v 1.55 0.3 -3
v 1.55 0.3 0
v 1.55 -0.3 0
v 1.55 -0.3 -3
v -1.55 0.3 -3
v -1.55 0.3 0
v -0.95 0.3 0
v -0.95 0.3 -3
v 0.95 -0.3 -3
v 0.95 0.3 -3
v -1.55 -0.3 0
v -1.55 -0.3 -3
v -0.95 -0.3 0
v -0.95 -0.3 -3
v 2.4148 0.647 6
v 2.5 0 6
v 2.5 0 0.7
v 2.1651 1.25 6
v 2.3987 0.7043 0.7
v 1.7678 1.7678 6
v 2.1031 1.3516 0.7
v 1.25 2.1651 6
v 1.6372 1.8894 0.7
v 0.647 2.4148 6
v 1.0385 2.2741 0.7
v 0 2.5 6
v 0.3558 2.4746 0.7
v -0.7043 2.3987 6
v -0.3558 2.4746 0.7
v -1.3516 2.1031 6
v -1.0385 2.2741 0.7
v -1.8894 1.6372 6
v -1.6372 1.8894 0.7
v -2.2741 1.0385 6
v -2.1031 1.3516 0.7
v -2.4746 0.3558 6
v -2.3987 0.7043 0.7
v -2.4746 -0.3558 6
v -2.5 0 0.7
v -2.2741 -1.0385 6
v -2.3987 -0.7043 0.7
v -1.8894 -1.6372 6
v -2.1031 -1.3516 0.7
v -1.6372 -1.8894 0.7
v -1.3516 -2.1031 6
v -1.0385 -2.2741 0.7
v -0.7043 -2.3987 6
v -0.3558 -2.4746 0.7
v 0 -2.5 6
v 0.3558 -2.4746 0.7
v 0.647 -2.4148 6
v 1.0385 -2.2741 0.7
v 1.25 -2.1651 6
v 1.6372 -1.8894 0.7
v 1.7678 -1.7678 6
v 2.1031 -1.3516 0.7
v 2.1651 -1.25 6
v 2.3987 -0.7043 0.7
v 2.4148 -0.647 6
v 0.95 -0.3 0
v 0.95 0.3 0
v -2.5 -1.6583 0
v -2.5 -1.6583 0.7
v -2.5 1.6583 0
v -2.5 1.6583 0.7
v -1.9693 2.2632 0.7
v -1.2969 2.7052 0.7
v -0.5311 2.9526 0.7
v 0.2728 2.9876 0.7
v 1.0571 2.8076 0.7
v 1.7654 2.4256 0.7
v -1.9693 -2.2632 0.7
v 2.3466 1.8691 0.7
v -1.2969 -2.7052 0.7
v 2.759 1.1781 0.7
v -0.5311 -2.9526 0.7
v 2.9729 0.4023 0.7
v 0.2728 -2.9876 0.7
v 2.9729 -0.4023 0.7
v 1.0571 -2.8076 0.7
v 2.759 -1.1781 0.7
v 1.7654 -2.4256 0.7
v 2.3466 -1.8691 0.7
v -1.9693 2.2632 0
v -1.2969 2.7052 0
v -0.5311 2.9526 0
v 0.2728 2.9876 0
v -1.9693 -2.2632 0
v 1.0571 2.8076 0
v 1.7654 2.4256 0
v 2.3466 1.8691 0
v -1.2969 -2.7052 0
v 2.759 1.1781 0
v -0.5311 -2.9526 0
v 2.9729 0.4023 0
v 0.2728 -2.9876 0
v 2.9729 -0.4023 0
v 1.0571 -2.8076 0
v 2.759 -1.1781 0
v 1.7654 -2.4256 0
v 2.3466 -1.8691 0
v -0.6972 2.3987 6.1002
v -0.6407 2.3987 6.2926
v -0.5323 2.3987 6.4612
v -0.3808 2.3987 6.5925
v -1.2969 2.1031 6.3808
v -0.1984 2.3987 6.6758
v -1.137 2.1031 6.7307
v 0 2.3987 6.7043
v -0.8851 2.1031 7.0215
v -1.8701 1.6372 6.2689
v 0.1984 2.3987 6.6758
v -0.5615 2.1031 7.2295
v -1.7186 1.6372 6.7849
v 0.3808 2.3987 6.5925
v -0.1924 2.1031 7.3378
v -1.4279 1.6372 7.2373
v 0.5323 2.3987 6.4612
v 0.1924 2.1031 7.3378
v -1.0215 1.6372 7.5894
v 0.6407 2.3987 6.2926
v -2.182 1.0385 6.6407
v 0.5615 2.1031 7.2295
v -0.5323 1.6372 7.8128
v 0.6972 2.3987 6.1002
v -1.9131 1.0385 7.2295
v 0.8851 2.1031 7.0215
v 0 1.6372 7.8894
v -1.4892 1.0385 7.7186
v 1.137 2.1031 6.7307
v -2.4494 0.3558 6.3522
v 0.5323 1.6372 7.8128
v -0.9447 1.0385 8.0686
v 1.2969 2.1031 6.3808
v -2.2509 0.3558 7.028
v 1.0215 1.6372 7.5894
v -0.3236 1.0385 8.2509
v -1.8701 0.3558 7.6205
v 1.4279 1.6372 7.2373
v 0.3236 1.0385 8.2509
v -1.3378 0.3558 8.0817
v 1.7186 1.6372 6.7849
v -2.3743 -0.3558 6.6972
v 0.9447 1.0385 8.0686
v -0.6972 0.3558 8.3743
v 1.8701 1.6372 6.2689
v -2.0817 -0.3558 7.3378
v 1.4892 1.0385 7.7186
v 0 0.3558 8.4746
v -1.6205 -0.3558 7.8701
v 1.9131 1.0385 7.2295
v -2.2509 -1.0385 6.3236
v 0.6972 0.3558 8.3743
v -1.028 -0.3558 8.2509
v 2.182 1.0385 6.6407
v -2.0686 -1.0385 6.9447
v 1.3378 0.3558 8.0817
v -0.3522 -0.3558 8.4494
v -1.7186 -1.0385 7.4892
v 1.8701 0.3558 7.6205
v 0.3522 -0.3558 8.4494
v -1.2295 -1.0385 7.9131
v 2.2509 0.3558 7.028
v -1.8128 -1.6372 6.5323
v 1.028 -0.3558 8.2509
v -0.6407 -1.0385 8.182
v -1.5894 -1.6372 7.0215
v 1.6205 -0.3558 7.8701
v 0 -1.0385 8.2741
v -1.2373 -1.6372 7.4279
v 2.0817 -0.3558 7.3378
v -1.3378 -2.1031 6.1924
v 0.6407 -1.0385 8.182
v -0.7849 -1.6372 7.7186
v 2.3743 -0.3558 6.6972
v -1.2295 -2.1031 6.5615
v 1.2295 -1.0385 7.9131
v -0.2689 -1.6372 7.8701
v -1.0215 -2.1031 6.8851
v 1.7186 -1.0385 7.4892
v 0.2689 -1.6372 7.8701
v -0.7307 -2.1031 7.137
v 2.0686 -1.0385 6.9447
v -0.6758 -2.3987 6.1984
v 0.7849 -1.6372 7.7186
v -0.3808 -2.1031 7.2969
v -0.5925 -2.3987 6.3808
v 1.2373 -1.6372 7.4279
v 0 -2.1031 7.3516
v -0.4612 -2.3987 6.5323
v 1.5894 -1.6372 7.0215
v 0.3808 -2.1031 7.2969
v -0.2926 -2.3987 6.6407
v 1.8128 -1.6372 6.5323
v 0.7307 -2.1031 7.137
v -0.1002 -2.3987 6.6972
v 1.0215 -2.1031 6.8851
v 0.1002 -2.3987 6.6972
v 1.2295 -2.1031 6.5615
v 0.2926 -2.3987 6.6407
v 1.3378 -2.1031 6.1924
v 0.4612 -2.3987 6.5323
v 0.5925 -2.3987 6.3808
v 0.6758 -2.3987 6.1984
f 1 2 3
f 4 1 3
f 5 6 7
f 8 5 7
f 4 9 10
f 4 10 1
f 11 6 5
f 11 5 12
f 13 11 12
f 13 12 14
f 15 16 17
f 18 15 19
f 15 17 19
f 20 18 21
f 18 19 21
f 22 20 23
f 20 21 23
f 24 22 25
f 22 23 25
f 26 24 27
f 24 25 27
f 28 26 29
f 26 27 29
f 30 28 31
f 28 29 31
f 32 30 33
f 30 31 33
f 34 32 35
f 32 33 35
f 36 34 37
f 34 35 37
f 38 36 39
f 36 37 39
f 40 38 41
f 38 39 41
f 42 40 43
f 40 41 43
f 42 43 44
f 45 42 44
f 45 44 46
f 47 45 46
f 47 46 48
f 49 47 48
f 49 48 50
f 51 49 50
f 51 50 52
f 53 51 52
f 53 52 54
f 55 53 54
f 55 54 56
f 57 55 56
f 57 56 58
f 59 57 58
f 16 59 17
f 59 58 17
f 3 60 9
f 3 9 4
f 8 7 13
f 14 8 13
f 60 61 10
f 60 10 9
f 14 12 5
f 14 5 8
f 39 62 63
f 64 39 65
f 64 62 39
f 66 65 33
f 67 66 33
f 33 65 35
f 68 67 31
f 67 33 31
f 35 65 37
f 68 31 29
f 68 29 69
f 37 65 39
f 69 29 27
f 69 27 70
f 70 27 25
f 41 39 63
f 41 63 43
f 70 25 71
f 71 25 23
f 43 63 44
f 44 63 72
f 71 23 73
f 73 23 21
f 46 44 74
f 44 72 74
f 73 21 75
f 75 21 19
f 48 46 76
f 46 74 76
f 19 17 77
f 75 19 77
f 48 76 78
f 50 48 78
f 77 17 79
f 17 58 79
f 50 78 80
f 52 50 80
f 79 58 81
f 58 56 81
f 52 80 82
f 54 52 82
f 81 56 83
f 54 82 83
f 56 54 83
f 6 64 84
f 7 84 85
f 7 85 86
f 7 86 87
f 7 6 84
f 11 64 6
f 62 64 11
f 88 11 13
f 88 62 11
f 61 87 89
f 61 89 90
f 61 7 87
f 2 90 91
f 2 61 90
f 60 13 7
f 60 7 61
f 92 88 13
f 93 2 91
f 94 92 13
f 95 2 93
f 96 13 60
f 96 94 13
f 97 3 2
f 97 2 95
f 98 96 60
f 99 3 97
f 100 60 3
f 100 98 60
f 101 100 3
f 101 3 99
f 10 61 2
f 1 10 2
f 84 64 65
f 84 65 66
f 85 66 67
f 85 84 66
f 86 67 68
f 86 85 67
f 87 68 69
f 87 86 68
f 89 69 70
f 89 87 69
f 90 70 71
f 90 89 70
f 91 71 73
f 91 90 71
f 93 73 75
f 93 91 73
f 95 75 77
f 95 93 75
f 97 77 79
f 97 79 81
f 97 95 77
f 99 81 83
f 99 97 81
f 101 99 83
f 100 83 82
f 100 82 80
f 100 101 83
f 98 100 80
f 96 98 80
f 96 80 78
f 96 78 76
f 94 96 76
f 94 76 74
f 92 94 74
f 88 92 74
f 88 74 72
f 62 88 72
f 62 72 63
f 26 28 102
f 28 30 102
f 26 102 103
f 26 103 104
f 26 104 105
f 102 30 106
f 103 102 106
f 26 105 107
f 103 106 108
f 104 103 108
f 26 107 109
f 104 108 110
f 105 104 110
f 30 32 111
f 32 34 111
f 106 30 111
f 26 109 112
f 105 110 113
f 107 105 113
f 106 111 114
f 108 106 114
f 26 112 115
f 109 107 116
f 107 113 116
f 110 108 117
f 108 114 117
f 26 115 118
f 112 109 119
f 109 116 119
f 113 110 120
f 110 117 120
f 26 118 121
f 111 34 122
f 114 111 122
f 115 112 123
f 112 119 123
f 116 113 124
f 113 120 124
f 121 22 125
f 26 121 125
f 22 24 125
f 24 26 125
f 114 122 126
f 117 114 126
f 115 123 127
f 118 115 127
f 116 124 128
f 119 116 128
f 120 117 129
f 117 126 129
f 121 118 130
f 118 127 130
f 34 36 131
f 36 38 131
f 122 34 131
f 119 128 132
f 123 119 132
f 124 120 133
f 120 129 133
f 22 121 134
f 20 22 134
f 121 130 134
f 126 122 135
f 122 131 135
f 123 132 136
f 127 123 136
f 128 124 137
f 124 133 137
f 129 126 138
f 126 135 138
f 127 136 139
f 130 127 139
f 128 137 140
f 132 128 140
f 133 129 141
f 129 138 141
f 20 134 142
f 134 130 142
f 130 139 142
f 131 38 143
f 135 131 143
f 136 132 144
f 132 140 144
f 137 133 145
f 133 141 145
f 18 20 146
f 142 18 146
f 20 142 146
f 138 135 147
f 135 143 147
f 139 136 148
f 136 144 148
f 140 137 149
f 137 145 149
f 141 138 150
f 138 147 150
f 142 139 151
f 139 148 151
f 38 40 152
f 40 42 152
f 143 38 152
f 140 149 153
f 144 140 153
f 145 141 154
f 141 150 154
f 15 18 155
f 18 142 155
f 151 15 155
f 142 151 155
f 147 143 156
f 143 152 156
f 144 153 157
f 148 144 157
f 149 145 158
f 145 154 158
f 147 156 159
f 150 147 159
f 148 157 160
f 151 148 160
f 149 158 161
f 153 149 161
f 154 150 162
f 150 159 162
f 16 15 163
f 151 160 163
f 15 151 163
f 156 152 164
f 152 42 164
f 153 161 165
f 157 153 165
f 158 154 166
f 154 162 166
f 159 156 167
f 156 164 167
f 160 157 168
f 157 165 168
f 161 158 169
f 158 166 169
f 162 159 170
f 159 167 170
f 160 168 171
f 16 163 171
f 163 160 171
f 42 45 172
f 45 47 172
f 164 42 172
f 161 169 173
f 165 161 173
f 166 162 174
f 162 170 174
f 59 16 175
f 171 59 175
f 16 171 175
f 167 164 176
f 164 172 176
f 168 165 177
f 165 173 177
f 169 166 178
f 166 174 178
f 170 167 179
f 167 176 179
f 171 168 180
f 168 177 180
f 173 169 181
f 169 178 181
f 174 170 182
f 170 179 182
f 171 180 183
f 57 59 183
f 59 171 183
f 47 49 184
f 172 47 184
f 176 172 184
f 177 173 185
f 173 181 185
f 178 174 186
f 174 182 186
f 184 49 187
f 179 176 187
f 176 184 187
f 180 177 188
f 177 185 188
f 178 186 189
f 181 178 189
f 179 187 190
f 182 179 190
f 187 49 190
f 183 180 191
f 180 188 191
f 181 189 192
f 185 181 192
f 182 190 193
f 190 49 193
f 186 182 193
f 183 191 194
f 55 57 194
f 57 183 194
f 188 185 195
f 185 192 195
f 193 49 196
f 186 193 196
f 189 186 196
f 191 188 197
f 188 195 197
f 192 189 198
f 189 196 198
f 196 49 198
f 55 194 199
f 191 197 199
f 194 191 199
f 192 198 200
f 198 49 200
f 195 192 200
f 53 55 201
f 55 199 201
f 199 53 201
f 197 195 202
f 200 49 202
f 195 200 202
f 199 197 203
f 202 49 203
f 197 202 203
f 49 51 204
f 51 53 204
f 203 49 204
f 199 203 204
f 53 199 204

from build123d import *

# Parameters (mm, degrees)
F0_R     = 2.5
F1_DEPTH = 6
F5_DEPTH = 0.7
F6_W     = 0.6
F6_H     = 0.6
F7_DEPTH = 3


with BuildPart() as f1:
    # F0 (on Top) → F1 (new body)
    with BuildSketch(Plane.XY):
        Circle(F0_R)
    extrude(amount=F1_DEPTH)

    # F2 (on face) → F3 (revolve)
    with BuildSketch(Plane.XY.offset(6)):
        with BuildLine():
            ThreePointArc((0, 2.5), (-2.5, 0), (0, -2.5))
            Line((0, -2.5), (0, 2.5))
        make_face()
    revolve(axis=Axis((0, 0, 6), (0, 1, 0)))

    # F4 (on face) → F5 (join)
    with BuildSketch(Plane(origin=(0, 0, 0), x_dir=(1, 0, 0), z_dir=(0, 0, -1))):
        with BuildLine():
            Line((-2.5, 1.658312), (-2.5, -1.658312))
            ThreePointArc((-2.5, -1.658312), (3, 0), (-2.5, 1.658312))
        make_face()
    extrude(amount=-F5_DEPTH)

    # F6 (on face) → F7 (join)
    with BuildSketch(Plane(origin=(0, 0, 0), x_dir=(1, 0, 0), z_dir=(0, 0, -1))):
        with Locations((1.25, 0)):
            Rectangle(F6_W, F6_H)
        with Locations((-1.25, 0)):
            Rectangle(F6_W, F6_H)
    extrude(amount=F7_DEPTH)


solid = f1.part
